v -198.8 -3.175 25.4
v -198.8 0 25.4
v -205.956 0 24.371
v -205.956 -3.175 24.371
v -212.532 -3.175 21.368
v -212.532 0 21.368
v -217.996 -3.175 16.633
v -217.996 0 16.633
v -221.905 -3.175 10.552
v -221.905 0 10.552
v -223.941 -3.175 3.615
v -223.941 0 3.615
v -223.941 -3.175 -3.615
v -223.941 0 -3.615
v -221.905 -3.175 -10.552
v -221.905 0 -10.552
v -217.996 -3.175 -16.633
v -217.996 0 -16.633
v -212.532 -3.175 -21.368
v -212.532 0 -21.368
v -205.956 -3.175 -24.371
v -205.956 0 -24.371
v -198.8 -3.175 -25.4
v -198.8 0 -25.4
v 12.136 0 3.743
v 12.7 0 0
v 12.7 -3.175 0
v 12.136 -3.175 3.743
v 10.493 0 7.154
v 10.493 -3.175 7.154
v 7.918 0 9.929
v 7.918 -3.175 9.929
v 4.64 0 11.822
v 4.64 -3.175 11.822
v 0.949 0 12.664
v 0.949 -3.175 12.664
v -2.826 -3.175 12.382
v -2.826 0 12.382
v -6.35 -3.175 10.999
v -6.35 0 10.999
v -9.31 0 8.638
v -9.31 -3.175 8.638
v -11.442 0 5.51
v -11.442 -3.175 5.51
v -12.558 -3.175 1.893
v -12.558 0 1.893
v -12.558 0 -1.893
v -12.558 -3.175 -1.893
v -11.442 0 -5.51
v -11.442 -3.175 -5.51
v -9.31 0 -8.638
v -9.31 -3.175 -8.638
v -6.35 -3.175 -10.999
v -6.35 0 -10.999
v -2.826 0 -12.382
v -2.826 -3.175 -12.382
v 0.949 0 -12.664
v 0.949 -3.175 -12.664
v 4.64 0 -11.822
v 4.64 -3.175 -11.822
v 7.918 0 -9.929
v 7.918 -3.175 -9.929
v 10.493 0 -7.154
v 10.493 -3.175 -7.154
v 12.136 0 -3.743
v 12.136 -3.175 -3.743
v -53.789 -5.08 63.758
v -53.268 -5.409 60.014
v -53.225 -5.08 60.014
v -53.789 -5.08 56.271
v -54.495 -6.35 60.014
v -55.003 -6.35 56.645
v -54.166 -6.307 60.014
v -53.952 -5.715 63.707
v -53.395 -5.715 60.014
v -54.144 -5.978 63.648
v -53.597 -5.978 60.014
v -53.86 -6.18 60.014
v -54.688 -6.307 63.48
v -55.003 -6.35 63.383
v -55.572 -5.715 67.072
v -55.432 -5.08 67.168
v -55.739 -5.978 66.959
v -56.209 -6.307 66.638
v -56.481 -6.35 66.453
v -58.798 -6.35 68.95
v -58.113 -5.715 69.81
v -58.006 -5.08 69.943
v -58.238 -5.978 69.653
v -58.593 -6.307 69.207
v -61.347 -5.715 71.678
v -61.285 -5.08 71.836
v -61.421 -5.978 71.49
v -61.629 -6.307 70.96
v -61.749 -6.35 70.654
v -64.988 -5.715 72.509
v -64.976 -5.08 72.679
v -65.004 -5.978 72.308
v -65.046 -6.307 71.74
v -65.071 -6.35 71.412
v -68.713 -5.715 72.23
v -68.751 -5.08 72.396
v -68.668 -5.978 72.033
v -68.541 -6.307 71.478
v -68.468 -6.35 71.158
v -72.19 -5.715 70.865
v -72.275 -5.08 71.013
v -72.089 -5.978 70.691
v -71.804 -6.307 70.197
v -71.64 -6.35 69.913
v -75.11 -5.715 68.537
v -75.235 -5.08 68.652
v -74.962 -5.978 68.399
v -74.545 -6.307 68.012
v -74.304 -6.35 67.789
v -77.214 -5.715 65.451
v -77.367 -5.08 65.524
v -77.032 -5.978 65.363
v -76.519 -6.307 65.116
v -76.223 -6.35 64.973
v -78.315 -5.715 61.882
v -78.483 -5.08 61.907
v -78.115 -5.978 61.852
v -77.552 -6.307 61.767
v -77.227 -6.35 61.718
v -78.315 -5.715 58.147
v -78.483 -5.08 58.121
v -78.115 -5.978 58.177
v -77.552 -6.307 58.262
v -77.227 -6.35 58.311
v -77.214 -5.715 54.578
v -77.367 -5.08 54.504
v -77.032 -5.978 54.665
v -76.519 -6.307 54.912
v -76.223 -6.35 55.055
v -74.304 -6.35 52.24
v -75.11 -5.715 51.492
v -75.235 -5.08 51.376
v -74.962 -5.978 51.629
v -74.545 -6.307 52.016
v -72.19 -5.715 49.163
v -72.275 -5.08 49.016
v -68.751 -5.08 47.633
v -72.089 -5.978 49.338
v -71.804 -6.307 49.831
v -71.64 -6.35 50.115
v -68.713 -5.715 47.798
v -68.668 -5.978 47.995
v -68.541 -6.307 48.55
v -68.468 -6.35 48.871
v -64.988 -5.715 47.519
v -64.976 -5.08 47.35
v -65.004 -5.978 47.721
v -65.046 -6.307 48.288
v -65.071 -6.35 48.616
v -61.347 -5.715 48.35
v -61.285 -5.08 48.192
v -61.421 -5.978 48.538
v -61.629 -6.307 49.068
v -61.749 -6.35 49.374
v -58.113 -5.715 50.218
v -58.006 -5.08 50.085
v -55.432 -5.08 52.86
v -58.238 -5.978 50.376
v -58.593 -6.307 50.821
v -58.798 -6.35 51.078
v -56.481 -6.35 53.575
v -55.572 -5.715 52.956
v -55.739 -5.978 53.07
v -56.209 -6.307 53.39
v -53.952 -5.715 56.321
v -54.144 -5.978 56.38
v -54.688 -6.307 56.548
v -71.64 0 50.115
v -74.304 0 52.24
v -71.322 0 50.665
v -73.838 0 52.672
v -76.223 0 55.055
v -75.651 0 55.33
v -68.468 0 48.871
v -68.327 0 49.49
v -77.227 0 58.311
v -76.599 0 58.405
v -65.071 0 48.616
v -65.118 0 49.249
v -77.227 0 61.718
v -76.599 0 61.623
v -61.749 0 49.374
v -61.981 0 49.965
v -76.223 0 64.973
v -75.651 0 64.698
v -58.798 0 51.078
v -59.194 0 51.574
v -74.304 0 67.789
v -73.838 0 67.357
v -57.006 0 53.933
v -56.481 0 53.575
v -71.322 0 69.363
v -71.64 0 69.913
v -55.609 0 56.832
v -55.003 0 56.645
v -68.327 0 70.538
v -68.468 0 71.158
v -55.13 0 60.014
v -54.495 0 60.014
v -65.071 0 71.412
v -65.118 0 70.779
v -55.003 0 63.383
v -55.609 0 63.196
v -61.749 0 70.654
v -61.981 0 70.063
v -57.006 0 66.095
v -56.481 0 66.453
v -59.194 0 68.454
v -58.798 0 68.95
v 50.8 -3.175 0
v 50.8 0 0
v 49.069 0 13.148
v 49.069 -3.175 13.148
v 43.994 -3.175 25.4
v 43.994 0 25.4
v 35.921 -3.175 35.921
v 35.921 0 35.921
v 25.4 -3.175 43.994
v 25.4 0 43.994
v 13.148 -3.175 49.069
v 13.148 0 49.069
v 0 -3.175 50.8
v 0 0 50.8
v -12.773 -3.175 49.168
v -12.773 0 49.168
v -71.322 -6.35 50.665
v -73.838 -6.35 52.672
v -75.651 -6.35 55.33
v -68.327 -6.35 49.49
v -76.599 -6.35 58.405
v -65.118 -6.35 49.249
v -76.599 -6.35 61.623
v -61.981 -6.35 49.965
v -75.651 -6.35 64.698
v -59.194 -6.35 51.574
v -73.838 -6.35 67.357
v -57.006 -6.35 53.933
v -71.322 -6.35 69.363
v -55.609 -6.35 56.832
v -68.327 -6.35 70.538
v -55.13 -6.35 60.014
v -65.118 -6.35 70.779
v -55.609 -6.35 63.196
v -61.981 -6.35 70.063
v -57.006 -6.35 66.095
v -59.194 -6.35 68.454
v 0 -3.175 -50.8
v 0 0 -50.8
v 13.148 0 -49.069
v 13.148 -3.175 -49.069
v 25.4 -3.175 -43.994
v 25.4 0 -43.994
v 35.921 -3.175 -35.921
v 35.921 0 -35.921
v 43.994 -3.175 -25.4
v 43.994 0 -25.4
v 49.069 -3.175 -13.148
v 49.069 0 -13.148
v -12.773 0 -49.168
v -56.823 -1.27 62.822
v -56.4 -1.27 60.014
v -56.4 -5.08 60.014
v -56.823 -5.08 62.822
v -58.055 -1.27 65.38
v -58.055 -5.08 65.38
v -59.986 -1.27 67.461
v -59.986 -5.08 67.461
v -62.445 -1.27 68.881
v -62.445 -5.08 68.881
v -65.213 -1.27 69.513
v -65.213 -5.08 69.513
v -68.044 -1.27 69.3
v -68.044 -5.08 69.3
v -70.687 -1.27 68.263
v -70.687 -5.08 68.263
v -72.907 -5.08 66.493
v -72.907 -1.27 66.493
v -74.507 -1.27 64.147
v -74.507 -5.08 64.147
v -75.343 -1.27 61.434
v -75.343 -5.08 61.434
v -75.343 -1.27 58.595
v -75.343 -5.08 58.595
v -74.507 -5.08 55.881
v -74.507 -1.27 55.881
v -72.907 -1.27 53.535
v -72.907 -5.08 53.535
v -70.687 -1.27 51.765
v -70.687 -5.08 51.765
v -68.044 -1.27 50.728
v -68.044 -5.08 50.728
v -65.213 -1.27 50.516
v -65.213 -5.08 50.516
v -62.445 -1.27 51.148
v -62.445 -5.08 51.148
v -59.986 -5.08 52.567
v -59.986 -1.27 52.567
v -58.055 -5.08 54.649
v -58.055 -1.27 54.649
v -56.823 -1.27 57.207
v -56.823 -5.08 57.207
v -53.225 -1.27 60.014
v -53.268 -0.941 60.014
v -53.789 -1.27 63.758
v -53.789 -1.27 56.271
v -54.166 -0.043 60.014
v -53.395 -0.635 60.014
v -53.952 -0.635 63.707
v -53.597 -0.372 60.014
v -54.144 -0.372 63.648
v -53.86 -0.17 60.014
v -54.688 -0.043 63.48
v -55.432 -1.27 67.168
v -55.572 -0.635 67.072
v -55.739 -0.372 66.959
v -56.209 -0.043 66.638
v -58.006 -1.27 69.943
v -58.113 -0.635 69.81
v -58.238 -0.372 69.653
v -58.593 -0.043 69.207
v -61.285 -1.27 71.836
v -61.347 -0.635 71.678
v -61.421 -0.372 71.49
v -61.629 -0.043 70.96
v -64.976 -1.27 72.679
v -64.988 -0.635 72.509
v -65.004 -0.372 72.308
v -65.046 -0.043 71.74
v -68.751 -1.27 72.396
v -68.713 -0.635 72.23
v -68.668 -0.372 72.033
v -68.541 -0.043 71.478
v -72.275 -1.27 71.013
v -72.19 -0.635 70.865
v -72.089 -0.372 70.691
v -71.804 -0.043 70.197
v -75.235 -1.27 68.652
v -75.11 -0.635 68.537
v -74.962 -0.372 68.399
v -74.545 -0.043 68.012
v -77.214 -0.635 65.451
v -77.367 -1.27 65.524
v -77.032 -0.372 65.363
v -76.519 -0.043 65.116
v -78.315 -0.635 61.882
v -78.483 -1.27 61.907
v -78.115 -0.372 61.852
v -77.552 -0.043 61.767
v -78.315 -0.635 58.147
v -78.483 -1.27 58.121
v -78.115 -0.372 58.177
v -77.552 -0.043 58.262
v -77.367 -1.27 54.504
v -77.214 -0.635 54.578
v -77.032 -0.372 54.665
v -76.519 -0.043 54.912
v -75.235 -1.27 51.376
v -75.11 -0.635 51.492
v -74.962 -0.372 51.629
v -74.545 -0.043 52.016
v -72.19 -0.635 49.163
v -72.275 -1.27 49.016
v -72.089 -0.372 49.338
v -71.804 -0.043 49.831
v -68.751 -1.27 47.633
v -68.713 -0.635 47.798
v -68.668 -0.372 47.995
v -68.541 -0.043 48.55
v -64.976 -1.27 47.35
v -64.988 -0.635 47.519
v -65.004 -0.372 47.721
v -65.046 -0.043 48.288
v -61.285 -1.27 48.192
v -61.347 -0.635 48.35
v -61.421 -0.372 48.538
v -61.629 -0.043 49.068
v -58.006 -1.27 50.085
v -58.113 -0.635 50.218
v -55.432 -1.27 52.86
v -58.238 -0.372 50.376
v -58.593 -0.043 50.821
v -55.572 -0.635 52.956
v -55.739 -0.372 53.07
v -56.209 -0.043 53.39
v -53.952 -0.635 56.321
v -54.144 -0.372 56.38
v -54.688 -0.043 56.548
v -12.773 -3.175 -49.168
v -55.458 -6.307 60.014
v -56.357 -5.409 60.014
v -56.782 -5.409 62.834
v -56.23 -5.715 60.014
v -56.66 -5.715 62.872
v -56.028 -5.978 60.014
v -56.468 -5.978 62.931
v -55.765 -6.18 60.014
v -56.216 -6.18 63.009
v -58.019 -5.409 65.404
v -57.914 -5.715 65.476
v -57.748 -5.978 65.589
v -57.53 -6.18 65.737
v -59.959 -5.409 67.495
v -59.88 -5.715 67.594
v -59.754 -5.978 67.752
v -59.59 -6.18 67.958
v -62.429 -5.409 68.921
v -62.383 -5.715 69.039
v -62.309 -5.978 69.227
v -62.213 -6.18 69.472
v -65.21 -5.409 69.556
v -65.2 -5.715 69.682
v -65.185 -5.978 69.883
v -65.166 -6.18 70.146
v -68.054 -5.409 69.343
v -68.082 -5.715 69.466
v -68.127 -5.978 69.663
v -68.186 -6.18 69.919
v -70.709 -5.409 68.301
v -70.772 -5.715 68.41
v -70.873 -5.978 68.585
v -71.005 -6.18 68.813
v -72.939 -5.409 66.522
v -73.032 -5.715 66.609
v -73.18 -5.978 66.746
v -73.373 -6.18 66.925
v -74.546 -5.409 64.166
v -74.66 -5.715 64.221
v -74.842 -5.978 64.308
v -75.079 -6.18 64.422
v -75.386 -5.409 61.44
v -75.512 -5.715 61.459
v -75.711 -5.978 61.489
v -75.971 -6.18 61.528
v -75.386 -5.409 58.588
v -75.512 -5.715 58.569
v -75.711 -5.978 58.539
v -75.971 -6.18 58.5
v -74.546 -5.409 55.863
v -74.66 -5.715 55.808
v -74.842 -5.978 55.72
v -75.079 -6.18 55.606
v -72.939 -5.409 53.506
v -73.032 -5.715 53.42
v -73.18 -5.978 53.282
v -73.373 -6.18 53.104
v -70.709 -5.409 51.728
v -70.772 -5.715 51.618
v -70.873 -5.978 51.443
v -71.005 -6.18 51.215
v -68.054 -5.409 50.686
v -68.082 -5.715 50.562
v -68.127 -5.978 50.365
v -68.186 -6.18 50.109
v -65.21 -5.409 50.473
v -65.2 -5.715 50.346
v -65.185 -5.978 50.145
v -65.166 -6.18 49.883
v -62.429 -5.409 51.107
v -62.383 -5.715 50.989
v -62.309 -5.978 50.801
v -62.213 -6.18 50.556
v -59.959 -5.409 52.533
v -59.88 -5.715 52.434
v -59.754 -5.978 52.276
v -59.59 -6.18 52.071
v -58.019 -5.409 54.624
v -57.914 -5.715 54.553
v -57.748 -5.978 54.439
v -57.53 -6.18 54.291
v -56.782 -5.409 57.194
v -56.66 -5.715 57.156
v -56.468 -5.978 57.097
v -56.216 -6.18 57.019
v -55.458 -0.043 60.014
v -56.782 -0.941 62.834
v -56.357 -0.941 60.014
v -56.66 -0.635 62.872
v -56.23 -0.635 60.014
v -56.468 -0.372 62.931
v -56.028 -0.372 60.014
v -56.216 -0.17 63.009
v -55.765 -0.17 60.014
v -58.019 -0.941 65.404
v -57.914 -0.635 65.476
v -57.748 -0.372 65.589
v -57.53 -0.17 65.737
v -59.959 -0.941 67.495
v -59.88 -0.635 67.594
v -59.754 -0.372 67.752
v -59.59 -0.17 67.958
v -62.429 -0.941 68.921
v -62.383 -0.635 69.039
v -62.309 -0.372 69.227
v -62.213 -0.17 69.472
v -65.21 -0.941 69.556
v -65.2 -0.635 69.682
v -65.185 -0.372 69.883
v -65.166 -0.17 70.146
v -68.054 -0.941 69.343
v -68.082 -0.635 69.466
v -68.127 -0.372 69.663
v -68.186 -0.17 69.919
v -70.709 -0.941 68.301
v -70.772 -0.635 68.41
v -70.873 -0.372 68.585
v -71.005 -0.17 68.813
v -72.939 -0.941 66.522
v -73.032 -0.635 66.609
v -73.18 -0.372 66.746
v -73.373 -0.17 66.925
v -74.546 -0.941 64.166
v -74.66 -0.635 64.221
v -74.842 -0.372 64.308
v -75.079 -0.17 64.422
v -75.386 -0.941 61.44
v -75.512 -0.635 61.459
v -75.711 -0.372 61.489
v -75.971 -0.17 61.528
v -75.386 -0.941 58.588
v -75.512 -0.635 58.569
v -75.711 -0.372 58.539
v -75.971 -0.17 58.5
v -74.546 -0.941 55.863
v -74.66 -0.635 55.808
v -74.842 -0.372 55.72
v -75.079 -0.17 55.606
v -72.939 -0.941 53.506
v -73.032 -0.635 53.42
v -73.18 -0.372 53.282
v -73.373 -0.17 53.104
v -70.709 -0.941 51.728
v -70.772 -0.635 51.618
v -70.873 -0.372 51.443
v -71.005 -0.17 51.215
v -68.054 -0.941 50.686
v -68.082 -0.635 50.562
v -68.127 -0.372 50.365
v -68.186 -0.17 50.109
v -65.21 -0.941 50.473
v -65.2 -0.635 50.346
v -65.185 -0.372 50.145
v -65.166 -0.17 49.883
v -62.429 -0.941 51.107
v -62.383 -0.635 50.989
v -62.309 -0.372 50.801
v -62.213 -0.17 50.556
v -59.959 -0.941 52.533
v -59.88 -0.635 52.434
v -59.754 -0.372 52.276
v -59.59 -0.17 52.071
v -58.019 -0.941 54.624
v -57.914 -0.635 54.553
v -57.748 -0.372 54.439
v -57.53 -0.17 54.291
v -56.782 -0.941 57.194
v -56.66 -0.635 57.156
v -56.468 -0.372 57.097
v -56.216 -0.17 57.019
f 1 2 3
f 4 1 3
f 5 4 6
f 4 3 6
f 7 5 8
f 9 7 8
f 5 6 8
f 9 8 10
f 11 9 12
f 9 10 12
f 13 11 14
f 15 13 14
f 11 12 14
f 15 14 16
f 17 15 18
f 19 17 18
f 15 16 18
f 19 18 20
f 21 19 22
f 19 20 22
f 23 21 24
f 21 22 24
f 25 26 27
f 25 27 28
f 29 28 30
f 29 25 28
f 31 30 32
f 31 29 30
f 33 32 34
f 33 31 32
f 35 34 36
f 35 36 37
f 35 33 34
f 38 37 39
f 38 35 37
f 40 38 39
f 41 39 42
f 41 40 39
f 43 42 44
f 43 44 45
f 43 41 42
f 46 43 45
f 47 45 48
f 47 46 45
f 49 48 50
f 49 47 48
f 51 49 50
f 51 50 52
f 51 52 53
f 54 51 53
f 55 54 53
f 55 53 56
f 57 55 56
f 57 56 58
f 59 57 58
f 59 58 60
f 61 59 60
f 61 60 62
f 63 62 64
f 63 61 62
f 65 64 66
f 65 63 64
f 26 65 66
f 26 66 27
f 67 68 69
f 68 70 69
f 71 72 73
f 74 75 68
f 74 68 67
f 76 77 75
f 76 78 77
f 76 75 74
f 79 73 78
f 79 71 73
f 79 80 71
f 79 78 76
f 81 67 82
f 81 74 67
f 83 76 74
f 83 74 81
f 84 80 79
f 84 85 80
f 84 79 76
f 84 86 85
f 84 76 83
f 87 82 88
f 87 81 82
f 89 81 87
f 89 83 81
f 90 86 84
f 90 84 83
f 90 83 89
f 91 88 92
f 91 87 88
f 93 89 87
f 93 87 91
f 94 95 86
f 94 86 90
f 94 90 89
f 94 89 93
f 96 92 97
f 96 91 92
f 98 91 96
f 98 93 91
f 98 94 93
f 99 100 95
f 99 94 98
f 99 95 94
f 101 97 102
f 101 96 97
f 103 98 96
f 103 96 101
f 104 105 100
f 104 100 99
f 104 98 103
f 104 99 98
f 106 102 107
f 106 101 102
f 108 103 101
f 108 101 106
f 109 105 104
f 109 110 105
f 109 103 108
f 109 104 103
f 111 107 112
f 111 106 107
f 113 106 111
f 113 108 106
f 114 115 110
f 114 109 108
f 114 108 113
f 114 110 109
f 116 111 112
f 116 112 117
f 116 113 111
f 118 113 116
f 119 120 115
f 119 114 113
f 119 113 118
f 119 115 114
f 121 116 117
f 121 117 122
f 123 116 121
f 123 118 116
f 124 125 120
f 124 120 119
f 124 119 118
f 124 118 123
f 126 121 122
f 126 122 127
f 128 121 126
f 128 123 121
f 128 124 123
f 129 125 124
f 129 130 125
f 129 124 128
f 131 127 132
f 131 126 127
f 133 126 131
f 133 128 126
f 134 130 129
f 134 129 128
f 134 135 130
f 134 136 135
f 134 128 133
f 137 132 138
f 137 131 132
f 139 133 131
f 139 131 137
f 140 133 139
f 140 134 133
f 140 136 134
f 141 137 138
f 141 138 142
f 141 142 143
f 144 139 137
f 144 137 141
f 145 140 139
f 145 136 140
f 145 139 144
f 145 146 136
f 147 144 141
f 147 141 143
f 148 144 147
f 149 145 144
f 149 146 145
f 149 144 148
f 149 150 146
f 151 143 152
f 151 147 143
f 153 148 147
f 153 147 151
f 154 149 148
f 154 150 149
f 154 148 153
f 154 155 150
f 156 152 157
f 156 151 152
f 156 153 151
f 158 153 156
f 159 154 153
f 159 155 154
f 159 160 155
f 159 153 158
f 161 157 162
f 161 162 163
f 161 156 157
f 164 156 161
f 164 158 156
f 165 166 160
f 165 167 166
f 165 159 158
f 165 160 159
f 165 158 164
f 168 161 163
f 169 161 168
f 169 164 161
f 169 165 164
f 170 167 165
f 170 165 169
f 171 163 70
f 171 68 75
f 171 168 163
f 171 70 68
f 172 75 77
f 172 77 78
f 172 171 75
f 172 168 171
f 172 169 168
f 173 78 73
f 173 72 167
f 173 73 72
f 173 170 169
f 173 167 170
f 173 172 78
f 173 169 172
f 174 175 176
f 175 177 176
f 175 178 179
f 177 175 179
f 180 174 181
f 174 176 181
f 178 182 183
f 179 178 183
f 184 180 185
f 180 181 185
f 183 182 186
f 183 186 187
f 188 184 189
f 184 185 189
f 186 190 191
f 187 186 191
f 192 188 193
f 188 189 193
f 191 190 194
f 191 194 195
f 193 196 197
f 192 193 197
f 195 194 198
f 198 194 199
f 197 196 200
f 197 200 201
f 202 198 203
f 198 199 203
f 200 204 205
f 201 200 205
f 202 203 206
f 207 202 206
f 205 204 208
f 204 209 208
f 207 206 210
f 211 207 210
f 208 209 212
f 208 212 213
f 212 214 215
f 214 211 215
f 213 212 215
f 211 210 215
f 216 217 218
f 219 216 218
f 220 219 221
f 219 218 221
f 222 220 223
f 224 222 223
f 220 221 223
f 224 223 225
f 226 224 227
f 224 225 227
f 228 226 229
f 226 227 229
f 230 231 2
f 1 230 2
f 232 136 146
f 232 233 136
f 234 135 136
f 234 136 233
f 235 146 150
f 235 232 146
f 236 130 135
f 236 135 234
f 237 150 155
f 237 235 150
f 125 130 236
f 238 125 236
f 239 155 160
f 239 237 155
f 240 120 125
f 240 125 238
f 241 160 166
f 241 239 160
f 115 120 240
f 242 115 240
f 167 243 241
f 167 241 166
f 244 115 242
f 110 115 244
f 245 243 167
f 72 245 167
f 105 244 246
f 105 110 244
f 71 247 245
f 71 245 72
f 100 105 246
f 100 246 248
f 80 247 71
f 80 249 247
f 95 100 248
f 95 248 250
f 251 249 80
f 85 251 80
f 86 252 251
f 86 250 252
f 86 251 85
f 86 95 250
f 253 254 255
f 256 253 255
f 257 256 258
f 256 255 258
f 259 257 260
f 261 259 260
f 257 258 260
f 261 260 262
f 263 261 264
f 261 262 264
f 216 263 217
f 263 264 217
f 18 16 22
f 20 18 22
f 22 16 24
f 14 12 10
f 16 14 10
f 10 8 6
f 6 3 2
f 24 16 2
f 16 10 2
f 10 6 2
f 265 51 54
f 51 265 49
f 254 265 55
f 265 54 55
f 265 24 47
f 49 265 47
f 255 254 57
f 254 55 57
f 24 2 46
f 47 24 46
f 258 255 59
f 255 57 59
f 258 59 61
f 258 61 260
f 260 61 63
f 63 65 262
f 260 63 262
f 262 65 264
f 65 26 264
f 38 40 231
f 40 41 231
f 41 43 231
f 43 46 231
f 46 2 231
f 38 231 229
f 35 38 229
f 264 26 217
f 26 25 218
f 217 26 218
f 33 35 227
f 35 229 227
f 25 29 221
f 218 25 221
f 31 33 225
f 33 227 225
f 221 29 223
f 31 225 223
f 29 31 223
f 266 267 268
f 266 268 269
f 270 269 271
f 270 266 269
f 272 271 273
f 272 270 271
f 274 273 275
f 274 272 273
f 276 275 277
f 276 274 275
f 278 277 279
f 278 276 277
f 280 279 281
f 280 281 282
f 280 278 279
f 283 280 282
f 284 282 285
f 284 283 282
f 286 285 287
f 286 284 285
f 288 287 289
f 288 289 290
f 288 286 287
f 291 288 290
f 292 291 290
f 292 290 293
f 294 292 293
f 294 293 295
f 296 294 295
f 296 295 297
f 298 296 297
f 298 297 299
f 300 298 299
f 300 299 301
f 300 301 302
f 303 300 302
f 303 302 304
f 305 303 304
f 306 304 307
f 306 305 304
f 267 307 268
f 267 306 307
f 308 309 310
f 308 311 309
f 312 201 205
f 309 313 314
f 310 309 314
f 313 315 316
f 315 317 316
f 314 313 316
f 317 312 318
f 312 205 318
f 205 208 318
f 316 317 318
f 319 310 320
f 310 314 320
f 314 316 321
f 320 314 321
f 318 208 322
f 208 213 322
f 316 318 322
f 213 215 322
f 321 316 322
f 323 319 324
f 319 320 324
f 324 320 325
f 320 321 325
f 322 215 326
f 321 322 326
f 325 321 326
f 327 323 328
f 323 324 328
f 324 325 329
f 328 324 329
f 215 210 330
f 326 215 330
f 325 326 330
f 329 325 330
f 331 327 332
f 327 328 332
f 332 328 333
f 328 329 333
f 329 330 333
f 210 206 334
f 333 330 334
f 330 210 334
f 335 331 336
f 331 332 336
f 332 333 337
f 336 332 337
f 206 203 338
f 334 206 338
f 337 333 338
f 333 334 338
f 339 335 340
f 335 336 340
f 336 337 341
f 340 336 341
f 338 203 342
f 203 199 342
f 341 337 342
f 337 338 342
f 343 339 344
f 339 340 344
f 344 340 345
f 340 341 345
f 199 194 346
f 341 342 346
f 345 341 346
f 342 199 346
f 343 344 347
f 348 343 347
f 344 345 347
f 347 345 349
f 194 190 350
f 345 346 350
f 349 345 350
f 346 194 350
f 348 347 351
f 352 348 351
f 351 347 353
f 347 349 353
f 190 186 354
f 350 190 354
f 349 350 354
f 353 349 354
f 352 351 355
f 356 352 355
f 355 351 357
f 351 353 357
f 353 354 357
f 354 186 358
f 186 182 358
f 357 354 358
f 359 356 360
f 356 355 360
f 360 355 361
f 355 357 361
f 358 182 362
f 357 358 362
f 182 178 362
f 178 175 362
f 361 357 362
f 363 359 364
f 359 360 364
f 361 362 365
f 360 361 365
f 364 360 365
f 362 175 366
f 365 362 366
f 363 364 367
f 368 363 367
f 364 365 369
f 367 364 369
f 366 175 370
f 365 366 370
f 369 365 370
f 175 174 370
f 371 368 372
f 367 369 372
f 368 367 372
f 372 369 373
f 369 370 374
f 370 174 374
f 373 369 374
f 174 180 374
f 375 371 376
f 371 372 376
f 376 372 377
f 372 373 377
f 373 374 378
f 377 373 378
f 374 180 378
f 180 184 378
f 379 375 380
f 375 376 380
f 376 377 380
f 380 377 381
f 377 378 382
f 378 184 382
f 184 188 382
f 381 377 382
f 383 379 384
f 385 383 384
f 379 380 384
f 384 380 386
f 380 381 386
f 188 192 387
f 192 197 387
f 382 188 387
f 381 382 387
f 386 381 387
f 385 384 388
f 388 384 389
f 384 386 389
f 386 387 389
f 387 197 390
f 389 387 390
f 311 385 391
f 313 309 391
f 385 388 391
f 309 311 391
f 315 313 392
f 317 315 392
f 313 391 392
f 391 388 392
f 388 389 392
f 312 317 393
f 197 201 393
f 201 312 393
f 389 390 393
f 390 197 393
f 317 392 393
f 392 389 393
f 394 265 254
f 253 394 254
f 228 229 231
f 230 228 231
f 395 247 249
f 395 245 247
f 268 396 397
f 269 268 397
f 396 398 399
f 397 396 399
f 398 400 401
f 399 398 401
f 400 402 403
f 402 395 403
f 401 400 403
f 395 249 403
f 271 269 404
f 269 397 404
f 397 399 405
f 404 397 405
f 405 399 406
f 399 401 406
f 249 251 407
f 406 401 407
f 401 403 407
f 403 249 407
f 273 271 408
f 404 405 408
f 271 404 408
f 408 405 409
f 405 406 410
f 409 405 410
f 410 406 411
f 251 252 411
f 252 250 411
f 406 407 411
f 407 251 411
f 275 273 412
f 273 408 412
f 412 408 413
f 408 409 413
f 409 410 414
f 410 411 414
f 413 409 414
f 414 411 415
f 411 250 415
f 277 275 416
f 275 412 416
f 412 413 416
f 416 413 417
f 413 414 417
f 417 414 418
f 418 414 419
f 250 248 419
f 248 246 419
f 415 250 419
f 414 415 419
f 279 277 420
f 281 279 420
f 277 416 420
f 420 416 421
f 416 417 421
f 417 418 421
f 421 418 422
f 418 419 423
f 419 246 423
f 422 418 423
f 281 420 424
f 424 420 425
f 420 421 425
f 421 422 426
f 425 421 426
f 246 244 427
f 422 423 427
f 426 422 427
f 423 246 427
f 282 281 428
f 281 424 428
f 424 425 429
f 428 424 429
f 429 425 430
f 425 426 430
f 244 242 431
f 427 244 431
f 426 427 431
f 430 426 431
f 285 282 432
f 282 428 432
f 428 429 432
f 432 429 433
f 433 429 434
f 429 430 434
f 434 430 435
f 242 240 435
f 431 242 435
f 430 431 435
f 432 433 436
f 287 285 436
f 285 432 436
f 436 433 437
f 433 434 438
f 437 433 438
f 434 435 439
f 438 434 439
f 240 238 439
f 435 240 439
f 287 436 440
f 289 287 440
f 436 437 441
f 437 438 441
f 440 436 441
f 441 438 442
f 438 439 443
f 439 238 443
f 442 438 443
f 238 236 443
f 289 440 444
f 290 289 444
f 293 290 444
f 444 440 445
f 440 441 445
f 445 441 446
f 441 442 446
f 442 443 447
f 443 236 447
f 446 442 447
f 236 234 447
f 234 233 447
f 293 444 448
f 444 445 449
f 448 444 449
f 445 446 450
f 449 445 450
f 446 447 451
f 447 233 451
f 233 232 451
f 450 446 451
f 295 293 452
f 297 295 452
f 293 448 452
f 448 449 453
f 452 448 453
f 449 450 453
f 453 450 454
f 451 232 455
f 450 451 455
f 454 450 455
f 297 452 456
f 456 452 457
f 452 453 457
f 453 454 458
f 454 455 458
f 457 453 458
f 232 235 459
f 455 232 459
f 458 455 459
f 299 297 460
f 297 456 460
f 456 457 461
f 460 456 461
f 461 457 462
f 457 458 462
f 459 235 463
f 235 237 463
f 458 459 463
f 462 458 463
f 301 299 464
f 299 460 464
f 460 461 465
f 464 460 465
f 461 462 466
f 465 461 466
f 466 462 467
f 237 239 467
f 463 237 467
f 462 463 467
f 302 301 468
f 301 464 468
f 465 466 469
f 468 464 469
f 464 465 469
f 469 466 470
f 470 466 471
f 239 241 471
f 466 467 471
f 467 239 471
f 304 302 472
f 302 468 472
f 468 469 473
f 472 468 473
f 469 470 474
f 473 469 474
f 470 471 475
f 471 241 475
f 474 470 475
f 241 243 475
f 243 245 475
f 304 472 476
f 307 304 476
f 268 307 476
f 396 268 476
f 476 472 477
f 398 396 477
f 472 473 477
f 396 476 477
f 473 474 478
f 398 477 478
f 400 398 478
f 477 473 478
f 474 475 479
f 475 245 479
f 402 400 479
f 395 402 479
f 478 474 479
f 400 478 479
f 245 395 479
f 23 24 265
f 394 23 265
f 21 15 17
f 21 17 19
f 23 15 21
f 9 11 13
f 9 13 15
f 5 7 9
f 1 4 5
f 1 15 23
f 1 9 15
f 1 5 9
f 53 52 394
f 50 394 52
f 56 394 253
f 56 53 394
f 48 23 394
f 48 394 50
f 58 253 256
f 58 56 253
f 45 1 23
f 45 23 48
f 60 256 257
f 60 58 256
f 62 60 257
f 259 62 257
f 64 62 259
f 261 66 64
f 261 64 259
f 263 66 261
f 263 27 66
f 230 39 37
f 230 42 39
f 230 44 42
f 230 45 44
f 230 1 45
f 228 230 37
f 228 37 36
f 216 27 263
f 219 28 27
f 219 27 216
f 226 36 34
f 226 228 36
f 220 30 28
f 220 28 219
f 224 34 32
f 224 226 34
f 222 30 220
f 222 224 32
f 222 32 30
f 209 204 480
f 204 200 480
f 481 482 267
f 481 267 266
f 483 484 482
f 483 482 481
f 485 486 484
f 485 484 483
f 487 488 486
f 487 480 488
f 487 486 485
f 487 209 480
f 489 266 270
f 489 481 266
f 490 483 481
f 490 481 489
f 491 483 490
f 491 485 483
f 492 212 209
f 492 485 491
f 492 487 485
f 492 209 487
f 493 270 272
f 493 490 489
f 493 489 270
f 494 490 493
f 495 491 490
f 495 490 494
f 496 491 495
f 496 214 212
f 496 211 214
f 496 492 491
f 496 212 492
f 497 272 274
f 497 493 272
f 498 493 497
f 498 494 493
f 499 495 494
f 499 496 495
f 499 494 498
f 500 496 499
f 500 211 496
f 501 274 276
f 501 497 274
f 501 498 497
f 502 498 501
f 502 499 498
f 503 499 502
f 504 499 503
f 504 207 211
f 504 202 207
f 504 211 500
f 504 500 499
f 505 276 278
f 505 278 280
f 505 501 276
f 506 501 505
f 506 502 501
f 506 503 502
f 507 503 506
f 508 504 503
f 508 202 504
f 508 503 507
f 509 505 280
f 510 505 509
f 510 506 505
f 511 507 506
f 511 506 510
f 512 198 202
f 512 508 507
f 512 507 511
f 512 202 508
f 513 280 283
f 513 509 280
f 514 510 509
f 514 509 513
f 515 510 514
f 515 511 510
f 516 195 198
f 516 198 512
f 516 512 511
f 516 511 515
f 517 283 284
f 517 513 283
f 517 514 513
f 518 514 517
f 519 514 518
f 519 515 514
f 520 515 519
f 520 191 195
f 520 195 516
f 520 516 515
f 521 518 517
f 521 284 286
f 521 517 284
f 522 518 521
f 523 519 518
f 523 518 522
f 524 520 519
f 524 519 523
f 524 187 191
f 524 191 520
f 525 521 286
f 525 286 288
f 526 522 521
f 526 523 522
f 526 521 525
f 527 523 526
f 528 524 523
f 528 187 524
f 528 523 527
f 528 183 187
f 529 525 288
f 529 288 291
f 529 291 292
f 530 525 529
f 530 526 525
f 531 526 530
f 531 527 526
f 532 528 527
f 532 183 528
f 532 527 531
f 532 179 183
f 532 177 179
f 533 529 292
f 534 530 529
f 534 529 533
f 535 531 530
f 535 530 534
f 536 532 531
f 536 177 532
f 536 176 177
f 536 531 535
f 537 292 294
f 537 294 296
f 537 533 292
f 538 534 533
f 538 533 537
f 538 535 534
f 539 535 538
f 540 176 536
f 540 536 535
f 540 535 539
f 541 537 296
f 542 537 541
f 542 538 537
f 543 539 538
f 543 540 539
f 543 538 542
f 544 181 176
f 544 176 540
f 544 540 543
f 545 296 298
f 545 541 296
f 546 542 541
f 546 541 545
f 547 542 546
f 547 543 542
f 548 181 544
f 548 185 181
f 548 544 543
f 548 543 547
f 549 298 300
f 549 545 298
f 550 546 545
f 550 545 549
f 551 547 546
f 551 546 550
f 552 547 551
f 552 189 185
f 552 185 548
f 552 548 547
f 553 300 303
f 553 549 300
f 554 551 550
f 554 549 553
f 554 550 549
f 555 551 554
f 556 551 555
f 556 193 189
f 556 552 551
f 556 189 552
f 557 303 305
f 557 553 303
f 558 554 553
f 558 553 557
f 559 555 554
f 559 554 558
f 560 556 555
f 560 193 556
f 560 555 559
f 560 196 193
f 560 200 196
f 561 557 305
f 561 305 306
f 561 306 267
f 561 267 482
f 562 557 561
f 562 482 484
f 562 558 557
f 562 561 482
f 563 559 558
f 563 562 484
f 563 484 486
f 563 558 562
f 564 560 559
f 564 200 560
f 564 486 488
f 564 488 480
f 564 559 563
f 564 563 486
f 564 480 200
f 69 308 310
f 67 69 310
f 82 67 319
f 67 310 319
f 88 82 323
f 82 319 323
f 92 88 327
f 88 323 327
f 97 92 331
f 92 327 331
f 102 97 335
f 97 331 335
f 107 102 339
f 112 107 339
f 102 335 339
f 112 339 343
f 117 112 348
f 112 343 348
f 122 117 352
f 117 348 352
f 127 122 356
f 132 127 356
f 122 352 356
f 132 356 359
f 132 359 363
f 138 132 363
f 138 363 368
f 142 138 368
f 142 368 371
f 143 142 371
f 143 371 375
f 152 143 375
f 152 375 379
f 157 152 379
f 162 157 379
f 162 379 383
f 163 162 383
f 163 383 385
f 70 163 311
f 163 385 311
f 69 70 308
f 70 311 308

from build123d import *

# Parameters (mm, degrees)
F0_R     = 12.7
F1_DEPTH = 3.175
F2_R     = 12.7
F2_R_2   = 9.525
F3_DEPTH = 6.35
F4_R     = 1.27


with BuildPart() as f1:
    # F0 (on Front) → F1 (new body)
    with BuildSketch(Plane.XZ):
        with BuildLine():
            ThreePointArc((0, -50.8), (35.9210244843, -35.9210244843), (50.8, 0))
            ThreePointArc((50.8, 0), (35.9210244843, 35.9210244843), (0, 50.8))
            Line((0, 50.8), (-12.7725829918, 49.1680905031))
            ThreePointArc((-12.7725829918, 49.1680905031), (-50.8, 0), (-12.7725829918, -49.1680905031))
            Line((-12.7725829918, -49.1680905031), (0, -50.8))
        make_face()
        Circle(F0_R, mode=Mode.SUBTRACT)
        with BuildLine():
            ThreePointArc((-12.7725829918, -49.1680905031), (-50.8, 0), (-12.7725829918, 49.1680905031))
            Line((-12.7725829918, 49.1680905031), (-198.8, 25.4))
            ThreePointArc((-198.8, 25.4), (-180.8394877579, 17.9605122421), (-173.4, 0))
            ThreePointArc((-173.4, 0), (-180.8394877579, -17.9605122421), (-198.8, -25.4))
            Line((-198.8, -25.4), (-12.7725829918, -49.1680905031))
        make_face()
        with BuildLine():
            ThreePointArc((-173.4, 0), (-180.8394877579, 17.9605122421), (-198.8, 25.4))
            ThreePointArc((-198.8, 25.4), (-224.2, 0), (-198.8, -25.4))
            ThreePointArc((-198.8, -25.4), (-180.8394877579, -17.9605122421), (-173.4, 0))
        make_face()
    extrude(amount=F1_DEPTH)


with BuildPart() as f3:
    # F2 (on Front) → F3 (new body)
    with BuildSketch(Plane.XZ):
        with Locations((-65.9247860312, 60.0141361356)):
            Circle(F2_R)
        with Locations((-65.9247860312, 60.0141361356)):
            Circle(F2_R_2, mode=Mode.SUBTRACT)
    extrude(amount=F3_DEPTH)

    # F4
    f4_edges = [f3.edges().sort_by_distance(p)[0] for p in [
        (-78.624786, -6.35, 60.014136),
        (-78.624786, 0, 60.014136),
        (-75.449786, -6.35, 60.014136),
        (-75.449786, 0, 60.014136),
    ]]
    fillet(f4_edges, radius=F4_R)


solid = Compound([f1.part, f3.part])
